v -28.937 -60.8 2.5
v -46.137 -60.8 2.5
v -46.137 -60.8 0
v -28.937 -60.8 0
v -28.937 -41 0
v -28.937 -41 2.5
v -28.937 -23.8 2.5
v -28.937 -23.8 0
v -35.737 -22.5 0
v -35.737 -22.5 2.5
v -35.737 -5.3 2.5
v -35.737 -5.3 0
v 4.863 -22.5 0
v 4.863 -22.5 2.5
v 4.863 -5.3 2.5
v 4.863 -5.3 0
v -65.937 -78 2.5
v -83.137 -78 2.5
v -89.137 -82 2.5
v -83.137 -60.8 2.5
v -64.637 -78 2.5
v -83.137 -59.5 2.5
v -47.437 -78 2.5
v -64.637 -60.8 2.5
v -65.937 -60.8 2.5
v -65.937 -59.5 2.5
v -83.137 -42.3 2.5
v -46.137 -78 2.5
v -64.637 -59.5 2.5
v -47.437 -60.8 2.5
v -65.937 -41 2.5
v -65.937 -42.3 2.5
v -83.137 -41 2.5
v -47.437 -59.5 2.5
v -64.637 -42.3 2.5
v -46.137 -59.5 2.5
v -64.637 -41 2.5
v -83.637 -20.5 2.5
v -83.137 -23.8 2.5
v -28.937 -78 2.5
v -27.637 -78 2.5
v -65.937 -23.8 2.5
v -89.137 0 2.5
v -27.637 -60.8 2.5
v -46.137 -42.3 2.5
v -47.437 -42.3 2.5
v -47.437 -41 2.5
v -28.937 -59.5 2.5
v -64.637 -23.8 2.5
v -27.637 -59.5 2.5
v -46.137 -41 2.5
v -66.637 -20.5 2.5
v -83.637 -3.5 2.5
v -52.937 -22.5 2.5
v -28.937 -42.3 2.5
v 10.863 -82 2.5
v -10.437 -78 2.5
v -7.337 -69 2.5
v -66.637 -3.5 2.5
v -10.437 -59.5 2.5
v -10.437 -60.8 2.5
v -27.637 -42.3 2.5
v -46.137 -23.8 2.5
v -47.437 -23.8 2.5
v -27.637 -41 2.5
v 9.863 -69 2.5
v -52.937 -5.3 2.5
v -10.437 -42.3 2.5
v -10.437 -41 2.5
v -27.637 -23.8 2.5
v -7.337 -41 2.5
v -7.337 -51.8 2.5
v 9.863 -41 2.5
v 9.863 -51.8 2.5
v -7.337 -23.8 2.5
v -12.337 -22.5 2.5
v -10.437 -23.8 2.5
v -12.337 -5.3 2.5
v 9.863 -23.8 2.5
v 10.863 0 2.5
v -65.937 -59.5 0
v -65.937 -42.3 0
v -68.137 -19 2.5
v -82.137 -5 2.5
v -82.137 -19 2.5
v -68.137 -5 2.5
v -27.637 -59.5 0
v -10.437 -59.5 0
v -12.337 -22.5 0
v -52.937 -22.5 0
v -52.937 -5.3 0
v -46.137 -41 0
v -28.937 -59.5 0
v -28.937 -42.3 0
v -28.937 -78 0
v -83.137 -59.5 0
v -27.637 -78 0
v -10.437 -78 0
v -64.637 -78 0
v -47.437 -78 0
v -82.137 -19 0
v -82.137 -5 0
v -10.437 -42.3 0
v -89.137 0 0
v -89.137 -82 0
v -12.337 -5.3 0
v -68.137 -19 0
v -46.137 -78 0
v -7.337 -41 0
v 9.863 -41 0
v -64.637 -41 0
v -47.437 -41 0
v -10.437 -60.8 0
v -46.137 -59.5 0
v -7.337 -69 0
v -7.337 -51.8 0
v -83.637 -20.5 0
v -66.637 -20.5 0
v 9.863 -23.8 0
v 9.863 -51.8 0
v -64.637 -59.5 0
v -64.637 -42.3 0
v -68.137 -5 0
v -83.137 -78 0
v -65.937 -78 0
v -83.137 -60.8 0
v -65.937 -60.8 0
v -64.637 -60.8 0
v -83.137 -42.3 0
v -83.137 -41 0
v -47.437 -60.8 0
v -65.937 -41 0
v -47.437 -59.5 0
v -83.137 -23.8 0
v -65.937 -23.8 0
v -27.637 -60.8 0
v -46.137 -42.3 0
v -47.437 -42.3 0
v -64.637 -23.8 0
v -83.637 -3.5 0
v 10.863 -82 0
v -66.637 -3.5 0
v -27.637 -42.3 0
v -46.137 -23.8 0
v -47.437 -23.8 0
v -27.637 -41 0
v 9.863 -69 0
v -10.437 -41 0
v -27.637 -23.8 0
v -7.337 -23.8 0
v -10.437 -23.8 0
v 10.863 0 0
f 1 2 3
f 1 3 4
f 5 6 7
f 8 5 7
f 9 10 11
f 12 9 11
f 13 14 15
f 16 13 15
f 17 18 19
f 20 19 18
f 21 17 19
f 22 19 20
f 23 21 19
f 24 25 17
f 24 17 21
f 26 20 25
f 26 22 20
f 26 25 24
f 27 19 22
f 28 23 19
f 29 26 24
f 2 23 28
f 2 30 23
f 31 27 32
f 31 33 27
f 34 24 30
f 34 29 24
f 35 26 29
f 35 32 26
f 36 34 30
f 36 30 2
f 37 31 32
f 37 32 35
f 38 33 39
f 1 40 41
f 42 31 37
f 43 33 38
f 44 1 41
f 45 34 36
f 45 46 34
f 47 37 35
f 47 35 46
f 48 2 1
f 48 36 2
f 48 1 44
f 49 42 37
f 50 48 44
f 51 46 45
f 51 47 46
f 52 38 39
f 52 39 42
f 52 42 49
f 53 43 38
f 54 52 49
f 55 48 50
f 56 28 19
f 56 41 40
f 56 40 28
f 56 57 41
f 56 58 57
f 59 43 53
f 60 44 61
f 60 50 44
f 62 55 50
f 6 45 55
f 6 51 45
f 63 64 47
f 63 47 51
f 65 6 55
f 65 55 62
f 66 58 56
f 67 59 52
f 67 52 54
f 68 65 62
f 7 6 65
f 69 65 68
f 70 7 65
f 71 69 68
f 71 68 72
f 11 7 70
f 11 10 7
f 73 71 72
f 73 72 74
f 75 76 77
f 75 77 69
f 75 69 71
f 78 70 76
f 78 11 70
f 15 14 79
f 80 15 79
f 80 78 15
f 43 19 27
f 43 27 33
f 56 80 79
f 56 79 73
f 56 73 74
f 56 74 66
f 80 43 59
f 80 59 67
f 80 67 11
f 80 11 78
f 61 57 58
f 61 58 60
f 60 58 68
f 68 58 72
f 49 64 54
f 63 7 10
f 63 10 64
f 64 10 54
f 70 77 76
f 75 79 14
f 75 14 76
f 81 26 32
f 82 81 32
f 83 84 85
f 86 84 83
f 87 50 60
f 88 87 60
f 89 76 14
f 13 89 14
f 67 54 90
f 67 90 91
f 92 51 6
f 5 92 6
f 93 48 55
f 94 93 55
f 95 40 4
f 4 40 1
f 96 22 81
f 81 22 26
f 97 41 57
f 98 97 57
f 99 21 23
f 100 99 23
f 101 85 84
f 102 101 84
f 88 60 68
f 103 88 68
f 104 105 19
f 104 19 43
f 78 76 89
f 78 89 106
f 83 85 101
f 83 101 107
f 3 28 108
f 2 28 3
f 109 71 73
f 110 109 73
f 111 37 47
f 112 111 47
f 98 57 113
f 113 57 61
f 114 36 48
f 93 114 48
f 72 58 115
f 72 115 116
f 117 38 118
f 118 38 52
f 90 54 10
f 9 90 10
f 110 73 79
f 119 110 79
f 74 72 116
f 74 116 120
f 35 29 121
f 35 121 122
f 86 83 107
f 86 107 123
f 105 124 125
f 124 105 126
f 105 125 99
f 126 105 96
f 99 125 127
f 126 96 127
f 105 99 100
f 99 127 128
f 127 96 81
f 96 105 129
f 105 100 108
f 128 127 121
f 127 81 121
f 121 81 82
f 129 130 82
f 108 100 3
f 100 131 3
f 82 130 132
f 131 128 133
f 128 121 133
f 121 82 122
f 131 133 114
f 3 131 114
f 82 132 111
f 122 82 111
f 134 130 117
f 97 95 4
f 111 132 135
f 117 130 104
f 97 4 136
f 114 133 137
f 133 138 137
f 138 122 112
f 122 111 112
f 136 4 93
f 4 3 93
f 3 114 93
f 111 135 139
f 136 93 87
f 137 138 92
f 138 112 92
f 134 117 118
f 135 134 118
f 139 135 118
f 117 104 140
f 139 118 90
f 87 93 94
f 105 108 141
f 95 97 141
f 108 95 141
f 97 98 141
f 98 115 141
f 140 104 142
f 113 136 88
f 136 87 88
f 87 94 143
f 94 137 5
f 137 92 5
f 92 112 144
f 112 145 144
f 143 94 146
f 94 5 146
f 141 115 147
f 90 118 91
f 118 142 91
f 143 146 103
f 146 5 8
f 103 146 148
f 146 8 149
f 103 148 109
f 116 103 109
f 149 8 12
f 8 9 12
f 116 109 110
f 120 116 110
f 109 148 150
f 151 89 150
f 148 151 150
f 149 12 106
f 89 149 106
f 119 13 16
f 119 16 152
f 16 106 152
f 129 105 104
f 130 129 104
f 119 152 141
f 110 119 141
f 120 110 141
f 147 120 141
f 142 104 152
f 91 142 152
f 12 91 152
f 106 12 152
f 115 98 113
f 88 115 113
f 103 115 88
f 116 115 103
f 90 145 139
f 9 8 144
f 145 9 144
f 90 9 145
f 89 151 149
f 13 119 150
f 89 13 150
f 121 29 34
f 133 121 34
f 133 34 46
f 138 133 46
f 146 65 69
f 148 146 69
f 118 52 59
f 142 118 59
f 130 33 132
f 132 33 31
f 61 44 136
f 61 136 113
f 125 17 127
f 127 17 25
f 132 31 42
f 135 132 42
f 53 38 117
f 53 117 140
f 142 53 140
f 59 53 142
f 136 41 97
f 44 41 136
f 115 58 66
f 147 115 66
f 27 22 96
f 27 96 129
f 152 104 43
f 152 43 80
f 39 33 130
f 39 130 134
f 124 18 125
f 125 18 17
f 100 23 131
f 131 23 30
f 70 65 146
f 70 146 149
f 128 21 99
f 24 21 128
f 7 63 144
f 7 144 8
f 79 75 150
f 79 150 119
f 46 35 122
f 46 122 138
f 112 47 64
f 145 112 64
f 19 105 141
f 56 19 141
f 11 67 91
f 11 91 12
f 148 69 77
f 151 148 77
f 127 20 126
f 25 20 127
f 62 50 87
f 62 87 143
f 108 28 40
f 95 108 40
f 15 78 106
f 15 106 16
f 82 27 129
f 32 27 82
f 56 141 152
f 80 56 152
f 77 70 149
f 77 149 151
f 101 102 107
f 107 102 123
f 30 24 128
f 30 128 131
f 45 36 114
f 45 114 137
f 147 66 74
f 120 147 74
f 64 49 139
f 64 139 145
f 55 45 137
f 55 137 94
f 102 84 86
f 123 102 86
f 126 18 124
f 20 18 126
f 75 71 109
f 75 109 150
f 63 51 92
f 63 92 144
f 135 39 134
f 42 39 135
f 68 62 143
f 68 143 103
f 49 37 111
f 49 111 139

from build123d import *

# Parameters (mm, degrees)
F0_W      = 100
F0_H      = 82
F1_DEPTH  = 2.5
F2_W      = 17.2
F2_H      = 17.2
F3_DEPTH  = 25
F2_W_2    = 17
F2_H_2    = 17
F2_W_3    = 14
F2_H_3    = 14
F4_DEPTH  = 25
F5_W      = 17.2
F5_H      = 17.2
F6_DEPTH  = 25
F7_W      = 17.2
F7_H      = 17.2
F8_DEPTH  = 25
F9_W      = 17.2
F9_H      = 17.2
F10_DEPTH = 25
F11_W     = 17.2
F11_H     = 17.2
F12_DEPTH = 25
F13_W     = 17.2
F13_H     = 17.2
F14_DEPTH = 25
F15_W     = 17.2
F15_H     = 17.2
F16_DEPTH = 25


with BuildPart() as f1:
    # F0 (on Top) → F1 (new body)
    with BuildSketch(Plane.XY):
        with Locations((-39.136762, -41)):
            Rectangle(F0_W, F0_H)
    extrude(amount=F1_DEPTH)

    # F2 (on face) → F3 (cut)
    with BuildSketch(Plane.XY.offset(2.5)):
        with Locations((-74.536762, -69.4)):
            Rectangle(F2_W, F2_H)
    extrude(amount=-F3_DEPTH, mode=Mode.SUBTRACT)

    # F2 (on face) → F4 (cut)
    with BuildSketch(Plane.XY.offset(2.5)):
        with Locations((-74.536762, -69.4)):
            Rectangle(F2_W, F2_H)
        with Locations((-74.536762, -50.9)):
            Rectangle(F2_W, F2_H)
        with Locations((-74.536762, -32.4)):
            Rectangle(F2_W, F2_H)
        with Locations((-75.136762, -12)):
            Rectangle(F2_W_2, F2_H_2)
        with Locations((-75.136762, -12)):
            Rectangle(F2_W_3, F2_H_3, mode=Mode.SUBTRACT)
    extrude(amount=-F4_DEPTH, mode=Mode.SUBTRACT)

    # F5 (on face) → F6 (cut)
    with BuildSketch(Plane.XY.offset(2.5)):
        with Locations((-56.036762, -69.4)):
            Rectangle(F5_W, F5_H)
        with Locations((-37.536762, -69.4)):
            Rectangle(F5_W, F5_H)
        with Locations((-19.036762, -69.4)):
            Rectangle(F5_W, F5_H)
    extrude(amount=-F6_DEPTH, mode=Mode.SUBTRACT)

    # F7 (on face) → F8 (cut)
    with BuildSketch(Plane.XY.offset(2.5)):
        with Locations((-56.036762, -50.9)):
            Rectangle(F7_W, F7_H)
        with Locations((-56.036762, -32.4)):
            Rectangle(F7_W, F7_H)
        with Locations((-37.536762, -50.9)):
            Rectangle(F7_W, F7_H)
        with Locations((-37.536762, -32.4)):
            Rectangle(F7_W, F7_H)
    extrude(amount=-F8_DEPTH, mode=Mode.SUBTRACT)

    # F9 (on face) → F10 (cut)
    with BuildSketch(Plane.XY.offset(2.5)):
        with Locations((-19.036762, -50.9)):
            Rectangle(F9_W, F9_H)
        with Locations((-19.036762, -32.4)):
            Rectangle(F9_W, F9_H)
    extrude(amount=-F10_DEPTH, mode=Mode.SUBTRACT)

    # F11 (on face) → F12 (cut)
    with BuildSketch(Plane.XY.offset(2.5)):
        with Locations((1.263238, -60.4)):
            Rectangle(F11_W, F11_H)
        with Locations((1.263238, -32.4)):
            Rectangle(F11_W, F11_H)
    extrude(amount=-F12_DEPTH, mode=Mode.SUBTRACT)

    # F13 (on face) → F14 (cut)
    with BuildSketch(Plane.XY.offset(2.5)):
        with Locations((-44.336762, -13.9)):
            Rectangle(F13_W, F13_H)
    extrude(amount=-F14_DEPTH, mode=Mode.SUBTRACT)

    # F15 (on face) → F16 (cut)
    with BuildSketch(Plane.XY.offset(2.5)):
        with Locations((-3.736762, -13.9)):
            Rectangle(F15_W, F15_H)
    extrude(amount=-F16_DEPTH, mode=Mode.SUBTRACT)


solid = f1.part
